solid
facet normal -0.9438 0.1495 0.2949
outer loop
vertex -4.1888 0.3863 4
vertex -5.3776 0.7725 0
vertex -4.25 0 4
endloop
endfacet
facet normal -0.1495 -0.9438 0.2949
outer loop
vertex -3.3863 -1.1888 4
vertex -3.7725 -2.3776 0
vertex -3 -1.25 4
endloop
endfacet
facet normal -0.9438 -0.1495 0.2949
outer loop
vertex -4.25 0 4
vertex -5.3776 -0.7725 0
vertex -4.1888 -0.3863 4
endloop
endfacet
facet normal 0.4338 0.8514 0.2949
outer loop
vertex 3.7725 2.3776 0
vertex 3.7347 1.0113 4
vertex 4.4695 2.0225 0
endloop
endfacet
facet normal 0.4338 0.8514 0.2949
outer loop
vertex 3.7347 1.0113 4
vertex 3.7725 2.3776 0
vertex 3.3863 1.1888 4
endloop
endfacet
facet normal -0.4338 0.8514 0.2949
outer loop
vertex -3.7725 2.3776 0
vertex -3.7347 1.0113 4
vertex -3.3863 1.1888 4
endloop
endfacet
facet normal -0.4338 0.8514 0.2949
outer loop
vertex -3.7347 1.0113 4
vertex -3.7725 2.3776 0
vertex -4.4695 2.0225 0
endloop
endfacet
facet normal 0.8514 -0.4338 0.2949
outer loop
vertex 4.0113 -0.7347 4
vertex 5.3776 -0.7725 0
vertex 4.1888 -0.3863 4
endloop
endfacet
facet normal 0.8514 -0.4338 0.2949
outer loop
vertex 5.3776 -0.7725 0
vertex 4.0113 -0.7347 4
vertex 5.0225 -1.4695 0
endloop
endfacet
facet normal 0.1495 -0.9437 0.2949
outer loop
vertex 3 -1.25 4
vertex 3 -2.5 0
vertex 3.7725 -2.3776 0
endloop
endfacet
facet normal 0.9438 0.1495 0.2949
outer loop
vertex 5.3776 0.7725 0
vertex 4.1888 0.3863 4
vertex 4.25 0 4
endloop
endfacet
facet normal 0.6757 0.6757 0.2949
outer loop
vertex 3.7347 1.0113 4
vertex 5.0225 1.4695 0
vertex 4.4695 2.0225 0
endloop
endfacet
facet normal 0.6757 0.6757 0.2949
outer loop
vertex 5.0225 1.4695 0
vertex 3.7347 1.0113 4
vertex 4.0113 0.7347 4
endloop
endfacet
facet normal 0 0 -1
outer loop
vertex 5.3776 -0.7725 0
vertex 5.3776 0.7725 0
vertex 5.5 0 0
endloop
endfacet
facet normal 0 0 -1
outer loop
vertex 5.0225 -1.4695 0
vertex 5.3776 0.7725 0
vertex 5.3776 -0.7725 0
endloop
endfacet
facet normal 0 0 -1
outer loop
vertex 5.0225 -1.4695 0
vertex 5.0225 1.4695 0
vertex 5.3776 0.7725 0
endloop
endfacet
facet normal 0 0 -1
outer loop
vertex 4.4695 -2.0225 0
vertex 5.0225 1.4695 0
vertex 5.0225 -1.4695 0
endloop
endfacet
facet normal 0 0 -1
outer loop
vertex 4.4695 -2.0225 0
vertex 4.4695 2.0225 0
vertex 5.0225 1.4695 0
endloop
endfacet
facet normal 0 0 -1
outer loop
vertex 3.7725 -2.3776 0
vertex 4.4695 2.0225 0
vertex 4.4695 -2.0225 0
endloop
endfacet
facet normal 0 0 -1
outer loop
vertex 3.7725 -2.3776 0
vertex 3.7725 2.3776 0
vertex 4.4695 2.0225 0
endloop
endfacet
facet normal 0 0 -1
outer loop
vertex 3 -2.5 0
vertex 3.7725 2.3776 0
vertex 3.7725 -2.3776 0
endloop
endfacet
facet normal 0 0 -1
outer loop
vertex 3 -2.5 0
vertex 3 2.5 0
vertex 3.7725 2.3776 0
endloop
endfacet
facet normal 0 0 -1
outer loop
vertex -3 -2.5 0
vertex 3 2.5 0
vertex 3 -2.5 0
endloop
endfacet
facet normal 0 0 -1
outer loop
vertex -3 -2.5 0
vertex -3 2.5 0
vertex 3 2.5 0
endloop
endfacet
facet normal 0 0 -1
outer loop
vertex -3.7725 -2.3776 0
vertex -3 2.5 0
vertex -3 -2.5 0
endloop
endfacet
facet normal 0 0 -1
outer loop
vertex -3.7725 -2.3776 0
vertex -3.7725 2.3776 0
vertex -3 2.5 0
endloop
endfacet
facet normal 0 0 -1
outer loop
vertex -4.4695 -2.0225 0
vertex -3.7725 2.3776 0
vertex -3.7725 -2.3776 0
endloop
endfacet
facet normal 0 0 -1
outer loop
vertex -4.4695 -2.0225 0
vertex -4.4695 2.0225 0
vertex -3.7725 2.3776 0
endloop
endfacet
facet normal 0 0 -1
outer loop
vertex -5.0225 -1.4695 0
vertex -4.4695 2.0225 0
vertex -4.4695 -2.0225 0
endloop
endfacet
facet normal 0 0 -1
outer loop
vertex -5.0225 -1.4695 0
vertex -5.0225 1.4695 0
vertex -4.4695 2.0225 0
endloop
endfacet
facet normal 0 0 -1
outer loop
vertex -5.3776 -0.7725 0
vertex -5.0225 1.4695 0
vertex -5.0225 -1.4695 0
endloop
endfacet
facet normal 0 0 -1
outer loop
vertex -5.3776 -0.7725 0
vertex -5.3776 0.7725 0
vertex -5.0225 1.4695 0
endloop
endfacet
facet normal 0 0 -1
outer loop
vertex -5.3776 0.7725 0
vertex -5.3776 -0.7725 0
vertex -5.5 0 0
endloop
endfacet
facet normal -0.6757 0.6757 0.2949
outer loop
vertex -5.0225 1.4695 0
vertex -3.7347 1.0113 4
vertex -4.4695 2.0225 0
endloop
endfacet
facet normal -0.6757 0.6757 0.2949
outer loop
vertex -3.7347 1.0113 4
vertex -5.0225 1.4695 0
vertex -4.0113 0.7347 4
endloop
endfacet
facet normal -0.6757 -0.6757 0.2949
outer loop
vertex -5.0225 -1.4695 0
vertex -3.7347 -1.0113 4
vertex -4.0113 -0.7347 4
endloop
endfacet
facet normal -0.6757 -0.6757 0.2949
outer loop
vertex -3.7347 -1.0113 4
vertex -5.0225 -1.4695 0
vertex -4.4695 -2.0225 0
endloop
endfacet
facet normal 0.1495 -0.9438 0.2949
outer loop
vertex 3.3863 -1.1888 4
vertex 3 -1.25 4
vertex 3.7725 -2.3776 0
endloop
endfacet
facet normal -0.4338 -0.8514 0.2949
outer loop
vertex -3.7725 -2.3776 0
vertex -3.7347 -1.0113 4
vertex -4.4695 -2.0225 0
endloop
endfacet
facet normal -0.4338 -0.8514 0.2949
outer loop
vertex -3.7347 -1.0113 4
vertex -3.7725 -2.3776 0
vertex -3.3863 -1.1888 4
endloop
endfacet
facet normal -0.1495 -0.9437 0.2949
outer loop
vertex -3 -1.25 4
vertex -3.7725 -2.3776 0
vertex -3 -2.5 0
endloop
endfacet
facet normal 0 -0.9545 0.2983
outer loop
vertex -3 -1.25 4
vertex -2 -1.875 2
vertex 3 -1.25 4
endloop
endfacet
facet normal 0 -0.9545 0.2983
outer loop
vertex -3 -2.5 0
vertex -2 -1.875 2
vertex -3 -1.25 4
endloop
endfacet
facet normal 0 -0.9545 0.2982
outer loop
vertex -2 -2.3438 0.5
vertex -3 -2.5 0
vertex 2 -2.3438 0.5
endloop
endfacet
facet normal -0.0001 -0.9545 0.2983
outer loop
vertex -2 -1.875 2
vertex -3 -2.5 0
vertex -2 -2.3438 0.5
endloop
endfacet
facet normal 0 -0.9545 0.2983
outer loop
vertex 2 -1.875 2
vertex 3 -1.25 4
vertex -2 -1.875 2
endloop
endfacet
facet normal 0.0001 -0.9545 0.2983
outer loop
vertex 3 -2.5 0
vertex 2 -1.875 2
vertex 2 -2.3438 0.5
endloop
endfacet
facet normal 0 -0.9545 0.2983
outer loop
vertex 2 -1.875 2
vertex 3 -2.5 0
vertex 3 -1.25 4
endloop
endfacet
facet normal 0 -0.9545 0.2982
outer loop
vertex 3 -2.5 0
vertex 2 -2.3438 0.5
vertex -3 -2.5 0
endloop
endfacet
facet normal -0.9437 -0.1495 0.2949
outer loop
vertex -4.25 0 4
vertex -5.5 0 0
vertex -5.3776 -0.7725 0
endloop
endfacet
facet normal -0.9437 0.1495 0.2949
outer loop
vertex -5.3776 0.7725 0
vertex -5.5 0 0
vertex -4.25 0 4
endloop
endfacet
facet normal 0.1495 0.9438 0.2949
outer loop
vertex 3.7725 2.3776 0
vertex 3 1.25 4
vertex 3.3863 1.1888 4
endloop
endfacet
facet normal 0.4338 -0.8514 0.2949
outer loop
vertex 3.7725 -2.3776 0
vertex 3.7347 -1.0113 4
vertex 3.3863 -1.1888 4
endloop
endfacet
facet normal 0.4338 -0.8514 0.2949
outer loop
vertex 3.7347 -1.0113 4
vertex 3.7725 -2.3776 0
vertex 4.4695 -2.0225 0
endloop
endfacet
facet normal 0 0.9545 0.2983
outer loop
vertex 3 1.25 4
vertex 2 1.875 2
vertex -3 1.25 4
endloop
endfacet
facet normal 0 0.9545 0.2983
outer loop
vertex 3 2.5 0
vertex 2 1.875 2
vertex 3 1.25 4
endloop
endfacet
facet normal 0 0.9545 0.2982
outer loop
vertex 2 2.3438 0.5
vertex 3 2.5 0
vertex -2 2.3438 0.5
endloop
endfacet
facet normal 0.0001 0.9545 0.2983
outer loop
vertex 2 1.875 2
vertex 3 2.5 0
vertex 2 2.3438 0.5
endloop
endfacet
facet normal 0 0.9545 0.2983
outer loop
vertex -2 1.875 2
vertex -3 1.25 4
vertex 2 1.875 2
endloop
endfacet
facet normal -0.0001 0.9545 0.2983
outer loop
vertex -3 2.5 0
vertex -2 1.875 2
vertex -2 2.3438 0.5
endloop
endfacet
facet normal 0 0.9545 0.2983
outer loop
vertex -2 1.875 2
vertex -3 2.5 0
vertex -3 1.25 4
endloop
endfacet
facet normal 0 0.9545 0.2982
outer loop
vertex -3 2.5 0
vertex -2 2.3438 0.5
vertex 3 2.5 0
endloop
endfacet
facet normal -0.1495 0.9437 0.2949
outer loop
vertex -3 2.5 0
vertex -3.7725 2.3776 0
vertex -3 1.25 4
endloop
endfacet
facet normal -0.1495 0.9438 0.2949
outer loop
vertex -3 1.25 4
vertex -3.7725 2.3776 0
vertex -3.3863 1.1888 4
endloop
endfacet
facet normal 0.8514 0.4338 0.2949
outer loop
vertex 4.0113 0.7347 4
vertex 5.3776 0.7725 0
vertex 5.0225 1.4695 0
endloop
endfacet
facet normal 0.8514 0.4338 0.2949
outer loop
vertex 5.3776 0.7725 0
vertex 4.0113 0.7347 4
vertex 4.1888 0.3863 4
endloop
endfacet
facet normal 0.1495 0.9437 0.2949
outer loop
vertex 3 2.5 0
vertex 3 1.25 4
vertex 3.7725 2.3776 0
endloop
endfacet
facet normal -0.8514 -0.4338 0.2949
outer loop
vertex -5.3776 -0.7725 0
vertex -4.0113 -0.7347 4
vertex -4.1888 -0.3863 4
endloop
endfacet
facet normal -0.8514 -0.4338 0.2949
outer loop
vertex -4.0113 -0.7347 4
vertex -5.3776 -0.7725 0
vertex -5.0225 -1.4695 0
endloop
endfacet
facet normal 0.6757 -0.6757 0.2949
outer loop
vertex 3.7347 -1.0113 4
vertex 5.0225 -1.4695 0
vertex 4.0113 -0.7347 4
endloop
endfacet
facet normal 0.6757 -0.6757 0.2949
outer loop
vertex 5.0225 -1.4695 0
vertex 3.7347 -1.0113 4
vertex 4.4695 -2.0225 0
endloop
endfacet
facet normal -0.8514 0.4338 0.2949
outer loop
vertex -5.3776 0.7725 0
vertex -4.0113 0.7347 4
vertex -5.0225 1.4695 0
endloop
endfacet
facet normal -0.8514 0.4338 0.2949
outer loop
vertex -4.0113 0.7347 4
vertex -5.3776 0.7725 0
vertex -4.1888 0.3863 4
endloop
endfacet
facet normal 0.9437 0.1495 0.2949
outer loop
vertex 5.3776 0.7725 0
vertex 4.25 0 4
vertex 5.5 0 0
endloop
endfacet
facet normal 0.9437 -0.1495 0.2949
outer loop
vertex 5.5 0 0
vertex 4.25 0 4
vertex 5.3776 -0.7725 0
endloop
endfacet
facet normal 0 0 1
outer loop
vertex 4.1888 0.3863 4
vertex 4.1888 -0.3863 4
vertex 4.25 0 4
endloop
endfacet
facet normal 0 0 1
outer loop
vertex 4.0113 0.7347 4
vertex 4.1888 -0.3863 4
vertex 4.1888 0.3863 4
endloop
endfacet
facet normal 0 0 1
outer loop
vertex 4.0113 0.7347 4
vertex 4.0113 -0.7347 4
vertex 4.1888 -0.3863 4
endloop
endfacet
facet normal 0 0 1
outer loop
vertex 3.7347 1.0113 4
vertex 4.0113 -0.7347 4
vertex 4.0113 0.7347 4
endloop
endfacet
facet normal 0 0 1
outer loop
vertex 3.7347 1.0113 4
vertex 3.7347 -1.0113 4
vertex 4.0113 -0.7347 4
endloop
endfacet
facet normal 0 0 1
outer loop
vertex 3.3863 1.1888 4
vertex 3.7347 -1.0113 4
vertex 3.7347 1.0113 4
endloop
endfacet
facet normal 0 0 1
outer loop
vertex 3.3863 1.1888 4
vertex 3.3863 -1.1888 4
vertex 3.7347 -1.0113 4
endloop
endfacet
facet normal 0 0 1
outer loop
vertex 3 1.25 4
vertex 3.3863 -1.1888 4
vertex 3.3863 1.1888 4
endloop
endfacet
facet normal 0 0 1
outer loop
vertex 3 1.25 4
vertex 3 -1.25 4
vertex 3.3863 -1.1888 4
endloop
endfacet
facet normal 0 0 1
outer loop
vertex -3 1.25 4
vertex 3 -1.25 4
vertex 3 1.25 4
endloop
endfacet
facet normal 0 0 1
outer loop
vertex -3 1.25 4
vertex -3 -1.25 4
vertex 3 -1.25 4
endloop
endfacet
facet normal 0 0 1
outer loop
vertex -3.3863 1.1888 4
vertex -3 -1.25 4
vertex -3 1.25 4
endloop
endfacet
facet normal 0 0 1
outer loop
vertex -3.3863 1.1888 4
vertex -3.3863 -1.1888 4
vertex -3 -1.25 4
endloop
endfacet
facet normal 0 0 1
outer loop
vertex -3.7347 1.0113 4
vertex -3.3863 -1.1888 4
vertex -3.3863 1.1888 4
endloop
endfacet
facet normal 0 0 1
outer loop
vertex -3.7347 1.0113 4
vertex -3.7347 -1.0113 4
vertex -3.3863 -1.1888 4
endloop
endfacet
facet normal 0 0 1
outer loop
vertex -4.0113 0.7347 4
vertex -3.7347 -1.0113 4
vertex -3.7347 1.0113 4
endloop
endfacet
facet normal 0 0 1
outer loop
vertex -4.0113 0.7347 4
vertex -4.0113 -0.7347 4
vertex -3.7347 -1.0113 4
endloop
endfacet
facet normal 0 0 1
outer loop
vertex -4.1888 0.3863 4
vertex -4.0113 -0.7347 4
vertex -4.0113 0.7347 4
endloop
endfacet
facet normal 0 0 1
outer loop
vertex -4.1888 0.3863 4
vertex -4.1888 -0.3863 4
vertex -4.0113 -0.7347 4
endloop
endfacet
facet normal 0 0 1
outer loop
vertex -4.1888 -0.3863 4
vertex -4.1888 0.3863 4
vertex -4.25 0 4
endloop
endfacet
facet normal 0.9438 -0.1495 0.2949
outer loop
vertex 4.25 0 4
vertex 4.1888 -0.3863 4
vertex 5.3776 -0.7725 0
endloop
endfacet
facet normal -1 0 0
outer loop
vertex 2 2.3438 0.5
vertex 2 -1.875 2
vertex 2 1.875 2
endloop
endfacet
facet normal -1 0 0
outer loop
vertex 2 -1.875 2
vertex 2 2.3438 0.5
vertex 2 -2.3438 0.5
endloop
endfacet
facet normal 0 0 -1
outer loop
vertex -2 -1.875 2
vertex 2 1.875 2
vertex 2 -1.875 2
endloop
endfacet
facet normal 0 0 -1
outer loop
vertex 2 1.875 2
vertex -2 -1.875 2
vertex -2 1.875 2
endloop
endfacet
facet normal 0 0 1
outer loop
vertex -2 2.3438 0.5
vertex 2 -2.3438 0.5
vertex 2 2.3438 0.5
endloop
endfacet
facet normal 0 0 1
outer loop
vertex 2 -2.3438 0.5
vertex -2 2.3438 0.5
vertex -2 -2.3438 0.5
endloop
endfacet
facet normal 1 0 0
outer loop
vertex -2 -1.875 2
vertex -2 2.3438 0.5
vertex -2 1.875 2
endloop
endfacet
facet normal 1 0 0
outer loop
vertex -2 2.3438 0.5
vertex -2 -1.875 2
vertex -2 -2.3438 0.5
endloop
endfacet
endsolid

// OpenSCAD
module ZiptieHoop() {
    difference() {
        hull() {
            translate([-3, 0, 0])
            cylinder($fn=20, d1 = 5, d2 = 2.5, h = 4);
            translate([3, 0, 0])
            cylinder($fn=20, d1 = 5, d2 = 2.5, h = 4);
        }
        translate([-2, -5, 0.5])
        cube([4, 10, 1.5]);
    }
}

ZiptieHoop();
